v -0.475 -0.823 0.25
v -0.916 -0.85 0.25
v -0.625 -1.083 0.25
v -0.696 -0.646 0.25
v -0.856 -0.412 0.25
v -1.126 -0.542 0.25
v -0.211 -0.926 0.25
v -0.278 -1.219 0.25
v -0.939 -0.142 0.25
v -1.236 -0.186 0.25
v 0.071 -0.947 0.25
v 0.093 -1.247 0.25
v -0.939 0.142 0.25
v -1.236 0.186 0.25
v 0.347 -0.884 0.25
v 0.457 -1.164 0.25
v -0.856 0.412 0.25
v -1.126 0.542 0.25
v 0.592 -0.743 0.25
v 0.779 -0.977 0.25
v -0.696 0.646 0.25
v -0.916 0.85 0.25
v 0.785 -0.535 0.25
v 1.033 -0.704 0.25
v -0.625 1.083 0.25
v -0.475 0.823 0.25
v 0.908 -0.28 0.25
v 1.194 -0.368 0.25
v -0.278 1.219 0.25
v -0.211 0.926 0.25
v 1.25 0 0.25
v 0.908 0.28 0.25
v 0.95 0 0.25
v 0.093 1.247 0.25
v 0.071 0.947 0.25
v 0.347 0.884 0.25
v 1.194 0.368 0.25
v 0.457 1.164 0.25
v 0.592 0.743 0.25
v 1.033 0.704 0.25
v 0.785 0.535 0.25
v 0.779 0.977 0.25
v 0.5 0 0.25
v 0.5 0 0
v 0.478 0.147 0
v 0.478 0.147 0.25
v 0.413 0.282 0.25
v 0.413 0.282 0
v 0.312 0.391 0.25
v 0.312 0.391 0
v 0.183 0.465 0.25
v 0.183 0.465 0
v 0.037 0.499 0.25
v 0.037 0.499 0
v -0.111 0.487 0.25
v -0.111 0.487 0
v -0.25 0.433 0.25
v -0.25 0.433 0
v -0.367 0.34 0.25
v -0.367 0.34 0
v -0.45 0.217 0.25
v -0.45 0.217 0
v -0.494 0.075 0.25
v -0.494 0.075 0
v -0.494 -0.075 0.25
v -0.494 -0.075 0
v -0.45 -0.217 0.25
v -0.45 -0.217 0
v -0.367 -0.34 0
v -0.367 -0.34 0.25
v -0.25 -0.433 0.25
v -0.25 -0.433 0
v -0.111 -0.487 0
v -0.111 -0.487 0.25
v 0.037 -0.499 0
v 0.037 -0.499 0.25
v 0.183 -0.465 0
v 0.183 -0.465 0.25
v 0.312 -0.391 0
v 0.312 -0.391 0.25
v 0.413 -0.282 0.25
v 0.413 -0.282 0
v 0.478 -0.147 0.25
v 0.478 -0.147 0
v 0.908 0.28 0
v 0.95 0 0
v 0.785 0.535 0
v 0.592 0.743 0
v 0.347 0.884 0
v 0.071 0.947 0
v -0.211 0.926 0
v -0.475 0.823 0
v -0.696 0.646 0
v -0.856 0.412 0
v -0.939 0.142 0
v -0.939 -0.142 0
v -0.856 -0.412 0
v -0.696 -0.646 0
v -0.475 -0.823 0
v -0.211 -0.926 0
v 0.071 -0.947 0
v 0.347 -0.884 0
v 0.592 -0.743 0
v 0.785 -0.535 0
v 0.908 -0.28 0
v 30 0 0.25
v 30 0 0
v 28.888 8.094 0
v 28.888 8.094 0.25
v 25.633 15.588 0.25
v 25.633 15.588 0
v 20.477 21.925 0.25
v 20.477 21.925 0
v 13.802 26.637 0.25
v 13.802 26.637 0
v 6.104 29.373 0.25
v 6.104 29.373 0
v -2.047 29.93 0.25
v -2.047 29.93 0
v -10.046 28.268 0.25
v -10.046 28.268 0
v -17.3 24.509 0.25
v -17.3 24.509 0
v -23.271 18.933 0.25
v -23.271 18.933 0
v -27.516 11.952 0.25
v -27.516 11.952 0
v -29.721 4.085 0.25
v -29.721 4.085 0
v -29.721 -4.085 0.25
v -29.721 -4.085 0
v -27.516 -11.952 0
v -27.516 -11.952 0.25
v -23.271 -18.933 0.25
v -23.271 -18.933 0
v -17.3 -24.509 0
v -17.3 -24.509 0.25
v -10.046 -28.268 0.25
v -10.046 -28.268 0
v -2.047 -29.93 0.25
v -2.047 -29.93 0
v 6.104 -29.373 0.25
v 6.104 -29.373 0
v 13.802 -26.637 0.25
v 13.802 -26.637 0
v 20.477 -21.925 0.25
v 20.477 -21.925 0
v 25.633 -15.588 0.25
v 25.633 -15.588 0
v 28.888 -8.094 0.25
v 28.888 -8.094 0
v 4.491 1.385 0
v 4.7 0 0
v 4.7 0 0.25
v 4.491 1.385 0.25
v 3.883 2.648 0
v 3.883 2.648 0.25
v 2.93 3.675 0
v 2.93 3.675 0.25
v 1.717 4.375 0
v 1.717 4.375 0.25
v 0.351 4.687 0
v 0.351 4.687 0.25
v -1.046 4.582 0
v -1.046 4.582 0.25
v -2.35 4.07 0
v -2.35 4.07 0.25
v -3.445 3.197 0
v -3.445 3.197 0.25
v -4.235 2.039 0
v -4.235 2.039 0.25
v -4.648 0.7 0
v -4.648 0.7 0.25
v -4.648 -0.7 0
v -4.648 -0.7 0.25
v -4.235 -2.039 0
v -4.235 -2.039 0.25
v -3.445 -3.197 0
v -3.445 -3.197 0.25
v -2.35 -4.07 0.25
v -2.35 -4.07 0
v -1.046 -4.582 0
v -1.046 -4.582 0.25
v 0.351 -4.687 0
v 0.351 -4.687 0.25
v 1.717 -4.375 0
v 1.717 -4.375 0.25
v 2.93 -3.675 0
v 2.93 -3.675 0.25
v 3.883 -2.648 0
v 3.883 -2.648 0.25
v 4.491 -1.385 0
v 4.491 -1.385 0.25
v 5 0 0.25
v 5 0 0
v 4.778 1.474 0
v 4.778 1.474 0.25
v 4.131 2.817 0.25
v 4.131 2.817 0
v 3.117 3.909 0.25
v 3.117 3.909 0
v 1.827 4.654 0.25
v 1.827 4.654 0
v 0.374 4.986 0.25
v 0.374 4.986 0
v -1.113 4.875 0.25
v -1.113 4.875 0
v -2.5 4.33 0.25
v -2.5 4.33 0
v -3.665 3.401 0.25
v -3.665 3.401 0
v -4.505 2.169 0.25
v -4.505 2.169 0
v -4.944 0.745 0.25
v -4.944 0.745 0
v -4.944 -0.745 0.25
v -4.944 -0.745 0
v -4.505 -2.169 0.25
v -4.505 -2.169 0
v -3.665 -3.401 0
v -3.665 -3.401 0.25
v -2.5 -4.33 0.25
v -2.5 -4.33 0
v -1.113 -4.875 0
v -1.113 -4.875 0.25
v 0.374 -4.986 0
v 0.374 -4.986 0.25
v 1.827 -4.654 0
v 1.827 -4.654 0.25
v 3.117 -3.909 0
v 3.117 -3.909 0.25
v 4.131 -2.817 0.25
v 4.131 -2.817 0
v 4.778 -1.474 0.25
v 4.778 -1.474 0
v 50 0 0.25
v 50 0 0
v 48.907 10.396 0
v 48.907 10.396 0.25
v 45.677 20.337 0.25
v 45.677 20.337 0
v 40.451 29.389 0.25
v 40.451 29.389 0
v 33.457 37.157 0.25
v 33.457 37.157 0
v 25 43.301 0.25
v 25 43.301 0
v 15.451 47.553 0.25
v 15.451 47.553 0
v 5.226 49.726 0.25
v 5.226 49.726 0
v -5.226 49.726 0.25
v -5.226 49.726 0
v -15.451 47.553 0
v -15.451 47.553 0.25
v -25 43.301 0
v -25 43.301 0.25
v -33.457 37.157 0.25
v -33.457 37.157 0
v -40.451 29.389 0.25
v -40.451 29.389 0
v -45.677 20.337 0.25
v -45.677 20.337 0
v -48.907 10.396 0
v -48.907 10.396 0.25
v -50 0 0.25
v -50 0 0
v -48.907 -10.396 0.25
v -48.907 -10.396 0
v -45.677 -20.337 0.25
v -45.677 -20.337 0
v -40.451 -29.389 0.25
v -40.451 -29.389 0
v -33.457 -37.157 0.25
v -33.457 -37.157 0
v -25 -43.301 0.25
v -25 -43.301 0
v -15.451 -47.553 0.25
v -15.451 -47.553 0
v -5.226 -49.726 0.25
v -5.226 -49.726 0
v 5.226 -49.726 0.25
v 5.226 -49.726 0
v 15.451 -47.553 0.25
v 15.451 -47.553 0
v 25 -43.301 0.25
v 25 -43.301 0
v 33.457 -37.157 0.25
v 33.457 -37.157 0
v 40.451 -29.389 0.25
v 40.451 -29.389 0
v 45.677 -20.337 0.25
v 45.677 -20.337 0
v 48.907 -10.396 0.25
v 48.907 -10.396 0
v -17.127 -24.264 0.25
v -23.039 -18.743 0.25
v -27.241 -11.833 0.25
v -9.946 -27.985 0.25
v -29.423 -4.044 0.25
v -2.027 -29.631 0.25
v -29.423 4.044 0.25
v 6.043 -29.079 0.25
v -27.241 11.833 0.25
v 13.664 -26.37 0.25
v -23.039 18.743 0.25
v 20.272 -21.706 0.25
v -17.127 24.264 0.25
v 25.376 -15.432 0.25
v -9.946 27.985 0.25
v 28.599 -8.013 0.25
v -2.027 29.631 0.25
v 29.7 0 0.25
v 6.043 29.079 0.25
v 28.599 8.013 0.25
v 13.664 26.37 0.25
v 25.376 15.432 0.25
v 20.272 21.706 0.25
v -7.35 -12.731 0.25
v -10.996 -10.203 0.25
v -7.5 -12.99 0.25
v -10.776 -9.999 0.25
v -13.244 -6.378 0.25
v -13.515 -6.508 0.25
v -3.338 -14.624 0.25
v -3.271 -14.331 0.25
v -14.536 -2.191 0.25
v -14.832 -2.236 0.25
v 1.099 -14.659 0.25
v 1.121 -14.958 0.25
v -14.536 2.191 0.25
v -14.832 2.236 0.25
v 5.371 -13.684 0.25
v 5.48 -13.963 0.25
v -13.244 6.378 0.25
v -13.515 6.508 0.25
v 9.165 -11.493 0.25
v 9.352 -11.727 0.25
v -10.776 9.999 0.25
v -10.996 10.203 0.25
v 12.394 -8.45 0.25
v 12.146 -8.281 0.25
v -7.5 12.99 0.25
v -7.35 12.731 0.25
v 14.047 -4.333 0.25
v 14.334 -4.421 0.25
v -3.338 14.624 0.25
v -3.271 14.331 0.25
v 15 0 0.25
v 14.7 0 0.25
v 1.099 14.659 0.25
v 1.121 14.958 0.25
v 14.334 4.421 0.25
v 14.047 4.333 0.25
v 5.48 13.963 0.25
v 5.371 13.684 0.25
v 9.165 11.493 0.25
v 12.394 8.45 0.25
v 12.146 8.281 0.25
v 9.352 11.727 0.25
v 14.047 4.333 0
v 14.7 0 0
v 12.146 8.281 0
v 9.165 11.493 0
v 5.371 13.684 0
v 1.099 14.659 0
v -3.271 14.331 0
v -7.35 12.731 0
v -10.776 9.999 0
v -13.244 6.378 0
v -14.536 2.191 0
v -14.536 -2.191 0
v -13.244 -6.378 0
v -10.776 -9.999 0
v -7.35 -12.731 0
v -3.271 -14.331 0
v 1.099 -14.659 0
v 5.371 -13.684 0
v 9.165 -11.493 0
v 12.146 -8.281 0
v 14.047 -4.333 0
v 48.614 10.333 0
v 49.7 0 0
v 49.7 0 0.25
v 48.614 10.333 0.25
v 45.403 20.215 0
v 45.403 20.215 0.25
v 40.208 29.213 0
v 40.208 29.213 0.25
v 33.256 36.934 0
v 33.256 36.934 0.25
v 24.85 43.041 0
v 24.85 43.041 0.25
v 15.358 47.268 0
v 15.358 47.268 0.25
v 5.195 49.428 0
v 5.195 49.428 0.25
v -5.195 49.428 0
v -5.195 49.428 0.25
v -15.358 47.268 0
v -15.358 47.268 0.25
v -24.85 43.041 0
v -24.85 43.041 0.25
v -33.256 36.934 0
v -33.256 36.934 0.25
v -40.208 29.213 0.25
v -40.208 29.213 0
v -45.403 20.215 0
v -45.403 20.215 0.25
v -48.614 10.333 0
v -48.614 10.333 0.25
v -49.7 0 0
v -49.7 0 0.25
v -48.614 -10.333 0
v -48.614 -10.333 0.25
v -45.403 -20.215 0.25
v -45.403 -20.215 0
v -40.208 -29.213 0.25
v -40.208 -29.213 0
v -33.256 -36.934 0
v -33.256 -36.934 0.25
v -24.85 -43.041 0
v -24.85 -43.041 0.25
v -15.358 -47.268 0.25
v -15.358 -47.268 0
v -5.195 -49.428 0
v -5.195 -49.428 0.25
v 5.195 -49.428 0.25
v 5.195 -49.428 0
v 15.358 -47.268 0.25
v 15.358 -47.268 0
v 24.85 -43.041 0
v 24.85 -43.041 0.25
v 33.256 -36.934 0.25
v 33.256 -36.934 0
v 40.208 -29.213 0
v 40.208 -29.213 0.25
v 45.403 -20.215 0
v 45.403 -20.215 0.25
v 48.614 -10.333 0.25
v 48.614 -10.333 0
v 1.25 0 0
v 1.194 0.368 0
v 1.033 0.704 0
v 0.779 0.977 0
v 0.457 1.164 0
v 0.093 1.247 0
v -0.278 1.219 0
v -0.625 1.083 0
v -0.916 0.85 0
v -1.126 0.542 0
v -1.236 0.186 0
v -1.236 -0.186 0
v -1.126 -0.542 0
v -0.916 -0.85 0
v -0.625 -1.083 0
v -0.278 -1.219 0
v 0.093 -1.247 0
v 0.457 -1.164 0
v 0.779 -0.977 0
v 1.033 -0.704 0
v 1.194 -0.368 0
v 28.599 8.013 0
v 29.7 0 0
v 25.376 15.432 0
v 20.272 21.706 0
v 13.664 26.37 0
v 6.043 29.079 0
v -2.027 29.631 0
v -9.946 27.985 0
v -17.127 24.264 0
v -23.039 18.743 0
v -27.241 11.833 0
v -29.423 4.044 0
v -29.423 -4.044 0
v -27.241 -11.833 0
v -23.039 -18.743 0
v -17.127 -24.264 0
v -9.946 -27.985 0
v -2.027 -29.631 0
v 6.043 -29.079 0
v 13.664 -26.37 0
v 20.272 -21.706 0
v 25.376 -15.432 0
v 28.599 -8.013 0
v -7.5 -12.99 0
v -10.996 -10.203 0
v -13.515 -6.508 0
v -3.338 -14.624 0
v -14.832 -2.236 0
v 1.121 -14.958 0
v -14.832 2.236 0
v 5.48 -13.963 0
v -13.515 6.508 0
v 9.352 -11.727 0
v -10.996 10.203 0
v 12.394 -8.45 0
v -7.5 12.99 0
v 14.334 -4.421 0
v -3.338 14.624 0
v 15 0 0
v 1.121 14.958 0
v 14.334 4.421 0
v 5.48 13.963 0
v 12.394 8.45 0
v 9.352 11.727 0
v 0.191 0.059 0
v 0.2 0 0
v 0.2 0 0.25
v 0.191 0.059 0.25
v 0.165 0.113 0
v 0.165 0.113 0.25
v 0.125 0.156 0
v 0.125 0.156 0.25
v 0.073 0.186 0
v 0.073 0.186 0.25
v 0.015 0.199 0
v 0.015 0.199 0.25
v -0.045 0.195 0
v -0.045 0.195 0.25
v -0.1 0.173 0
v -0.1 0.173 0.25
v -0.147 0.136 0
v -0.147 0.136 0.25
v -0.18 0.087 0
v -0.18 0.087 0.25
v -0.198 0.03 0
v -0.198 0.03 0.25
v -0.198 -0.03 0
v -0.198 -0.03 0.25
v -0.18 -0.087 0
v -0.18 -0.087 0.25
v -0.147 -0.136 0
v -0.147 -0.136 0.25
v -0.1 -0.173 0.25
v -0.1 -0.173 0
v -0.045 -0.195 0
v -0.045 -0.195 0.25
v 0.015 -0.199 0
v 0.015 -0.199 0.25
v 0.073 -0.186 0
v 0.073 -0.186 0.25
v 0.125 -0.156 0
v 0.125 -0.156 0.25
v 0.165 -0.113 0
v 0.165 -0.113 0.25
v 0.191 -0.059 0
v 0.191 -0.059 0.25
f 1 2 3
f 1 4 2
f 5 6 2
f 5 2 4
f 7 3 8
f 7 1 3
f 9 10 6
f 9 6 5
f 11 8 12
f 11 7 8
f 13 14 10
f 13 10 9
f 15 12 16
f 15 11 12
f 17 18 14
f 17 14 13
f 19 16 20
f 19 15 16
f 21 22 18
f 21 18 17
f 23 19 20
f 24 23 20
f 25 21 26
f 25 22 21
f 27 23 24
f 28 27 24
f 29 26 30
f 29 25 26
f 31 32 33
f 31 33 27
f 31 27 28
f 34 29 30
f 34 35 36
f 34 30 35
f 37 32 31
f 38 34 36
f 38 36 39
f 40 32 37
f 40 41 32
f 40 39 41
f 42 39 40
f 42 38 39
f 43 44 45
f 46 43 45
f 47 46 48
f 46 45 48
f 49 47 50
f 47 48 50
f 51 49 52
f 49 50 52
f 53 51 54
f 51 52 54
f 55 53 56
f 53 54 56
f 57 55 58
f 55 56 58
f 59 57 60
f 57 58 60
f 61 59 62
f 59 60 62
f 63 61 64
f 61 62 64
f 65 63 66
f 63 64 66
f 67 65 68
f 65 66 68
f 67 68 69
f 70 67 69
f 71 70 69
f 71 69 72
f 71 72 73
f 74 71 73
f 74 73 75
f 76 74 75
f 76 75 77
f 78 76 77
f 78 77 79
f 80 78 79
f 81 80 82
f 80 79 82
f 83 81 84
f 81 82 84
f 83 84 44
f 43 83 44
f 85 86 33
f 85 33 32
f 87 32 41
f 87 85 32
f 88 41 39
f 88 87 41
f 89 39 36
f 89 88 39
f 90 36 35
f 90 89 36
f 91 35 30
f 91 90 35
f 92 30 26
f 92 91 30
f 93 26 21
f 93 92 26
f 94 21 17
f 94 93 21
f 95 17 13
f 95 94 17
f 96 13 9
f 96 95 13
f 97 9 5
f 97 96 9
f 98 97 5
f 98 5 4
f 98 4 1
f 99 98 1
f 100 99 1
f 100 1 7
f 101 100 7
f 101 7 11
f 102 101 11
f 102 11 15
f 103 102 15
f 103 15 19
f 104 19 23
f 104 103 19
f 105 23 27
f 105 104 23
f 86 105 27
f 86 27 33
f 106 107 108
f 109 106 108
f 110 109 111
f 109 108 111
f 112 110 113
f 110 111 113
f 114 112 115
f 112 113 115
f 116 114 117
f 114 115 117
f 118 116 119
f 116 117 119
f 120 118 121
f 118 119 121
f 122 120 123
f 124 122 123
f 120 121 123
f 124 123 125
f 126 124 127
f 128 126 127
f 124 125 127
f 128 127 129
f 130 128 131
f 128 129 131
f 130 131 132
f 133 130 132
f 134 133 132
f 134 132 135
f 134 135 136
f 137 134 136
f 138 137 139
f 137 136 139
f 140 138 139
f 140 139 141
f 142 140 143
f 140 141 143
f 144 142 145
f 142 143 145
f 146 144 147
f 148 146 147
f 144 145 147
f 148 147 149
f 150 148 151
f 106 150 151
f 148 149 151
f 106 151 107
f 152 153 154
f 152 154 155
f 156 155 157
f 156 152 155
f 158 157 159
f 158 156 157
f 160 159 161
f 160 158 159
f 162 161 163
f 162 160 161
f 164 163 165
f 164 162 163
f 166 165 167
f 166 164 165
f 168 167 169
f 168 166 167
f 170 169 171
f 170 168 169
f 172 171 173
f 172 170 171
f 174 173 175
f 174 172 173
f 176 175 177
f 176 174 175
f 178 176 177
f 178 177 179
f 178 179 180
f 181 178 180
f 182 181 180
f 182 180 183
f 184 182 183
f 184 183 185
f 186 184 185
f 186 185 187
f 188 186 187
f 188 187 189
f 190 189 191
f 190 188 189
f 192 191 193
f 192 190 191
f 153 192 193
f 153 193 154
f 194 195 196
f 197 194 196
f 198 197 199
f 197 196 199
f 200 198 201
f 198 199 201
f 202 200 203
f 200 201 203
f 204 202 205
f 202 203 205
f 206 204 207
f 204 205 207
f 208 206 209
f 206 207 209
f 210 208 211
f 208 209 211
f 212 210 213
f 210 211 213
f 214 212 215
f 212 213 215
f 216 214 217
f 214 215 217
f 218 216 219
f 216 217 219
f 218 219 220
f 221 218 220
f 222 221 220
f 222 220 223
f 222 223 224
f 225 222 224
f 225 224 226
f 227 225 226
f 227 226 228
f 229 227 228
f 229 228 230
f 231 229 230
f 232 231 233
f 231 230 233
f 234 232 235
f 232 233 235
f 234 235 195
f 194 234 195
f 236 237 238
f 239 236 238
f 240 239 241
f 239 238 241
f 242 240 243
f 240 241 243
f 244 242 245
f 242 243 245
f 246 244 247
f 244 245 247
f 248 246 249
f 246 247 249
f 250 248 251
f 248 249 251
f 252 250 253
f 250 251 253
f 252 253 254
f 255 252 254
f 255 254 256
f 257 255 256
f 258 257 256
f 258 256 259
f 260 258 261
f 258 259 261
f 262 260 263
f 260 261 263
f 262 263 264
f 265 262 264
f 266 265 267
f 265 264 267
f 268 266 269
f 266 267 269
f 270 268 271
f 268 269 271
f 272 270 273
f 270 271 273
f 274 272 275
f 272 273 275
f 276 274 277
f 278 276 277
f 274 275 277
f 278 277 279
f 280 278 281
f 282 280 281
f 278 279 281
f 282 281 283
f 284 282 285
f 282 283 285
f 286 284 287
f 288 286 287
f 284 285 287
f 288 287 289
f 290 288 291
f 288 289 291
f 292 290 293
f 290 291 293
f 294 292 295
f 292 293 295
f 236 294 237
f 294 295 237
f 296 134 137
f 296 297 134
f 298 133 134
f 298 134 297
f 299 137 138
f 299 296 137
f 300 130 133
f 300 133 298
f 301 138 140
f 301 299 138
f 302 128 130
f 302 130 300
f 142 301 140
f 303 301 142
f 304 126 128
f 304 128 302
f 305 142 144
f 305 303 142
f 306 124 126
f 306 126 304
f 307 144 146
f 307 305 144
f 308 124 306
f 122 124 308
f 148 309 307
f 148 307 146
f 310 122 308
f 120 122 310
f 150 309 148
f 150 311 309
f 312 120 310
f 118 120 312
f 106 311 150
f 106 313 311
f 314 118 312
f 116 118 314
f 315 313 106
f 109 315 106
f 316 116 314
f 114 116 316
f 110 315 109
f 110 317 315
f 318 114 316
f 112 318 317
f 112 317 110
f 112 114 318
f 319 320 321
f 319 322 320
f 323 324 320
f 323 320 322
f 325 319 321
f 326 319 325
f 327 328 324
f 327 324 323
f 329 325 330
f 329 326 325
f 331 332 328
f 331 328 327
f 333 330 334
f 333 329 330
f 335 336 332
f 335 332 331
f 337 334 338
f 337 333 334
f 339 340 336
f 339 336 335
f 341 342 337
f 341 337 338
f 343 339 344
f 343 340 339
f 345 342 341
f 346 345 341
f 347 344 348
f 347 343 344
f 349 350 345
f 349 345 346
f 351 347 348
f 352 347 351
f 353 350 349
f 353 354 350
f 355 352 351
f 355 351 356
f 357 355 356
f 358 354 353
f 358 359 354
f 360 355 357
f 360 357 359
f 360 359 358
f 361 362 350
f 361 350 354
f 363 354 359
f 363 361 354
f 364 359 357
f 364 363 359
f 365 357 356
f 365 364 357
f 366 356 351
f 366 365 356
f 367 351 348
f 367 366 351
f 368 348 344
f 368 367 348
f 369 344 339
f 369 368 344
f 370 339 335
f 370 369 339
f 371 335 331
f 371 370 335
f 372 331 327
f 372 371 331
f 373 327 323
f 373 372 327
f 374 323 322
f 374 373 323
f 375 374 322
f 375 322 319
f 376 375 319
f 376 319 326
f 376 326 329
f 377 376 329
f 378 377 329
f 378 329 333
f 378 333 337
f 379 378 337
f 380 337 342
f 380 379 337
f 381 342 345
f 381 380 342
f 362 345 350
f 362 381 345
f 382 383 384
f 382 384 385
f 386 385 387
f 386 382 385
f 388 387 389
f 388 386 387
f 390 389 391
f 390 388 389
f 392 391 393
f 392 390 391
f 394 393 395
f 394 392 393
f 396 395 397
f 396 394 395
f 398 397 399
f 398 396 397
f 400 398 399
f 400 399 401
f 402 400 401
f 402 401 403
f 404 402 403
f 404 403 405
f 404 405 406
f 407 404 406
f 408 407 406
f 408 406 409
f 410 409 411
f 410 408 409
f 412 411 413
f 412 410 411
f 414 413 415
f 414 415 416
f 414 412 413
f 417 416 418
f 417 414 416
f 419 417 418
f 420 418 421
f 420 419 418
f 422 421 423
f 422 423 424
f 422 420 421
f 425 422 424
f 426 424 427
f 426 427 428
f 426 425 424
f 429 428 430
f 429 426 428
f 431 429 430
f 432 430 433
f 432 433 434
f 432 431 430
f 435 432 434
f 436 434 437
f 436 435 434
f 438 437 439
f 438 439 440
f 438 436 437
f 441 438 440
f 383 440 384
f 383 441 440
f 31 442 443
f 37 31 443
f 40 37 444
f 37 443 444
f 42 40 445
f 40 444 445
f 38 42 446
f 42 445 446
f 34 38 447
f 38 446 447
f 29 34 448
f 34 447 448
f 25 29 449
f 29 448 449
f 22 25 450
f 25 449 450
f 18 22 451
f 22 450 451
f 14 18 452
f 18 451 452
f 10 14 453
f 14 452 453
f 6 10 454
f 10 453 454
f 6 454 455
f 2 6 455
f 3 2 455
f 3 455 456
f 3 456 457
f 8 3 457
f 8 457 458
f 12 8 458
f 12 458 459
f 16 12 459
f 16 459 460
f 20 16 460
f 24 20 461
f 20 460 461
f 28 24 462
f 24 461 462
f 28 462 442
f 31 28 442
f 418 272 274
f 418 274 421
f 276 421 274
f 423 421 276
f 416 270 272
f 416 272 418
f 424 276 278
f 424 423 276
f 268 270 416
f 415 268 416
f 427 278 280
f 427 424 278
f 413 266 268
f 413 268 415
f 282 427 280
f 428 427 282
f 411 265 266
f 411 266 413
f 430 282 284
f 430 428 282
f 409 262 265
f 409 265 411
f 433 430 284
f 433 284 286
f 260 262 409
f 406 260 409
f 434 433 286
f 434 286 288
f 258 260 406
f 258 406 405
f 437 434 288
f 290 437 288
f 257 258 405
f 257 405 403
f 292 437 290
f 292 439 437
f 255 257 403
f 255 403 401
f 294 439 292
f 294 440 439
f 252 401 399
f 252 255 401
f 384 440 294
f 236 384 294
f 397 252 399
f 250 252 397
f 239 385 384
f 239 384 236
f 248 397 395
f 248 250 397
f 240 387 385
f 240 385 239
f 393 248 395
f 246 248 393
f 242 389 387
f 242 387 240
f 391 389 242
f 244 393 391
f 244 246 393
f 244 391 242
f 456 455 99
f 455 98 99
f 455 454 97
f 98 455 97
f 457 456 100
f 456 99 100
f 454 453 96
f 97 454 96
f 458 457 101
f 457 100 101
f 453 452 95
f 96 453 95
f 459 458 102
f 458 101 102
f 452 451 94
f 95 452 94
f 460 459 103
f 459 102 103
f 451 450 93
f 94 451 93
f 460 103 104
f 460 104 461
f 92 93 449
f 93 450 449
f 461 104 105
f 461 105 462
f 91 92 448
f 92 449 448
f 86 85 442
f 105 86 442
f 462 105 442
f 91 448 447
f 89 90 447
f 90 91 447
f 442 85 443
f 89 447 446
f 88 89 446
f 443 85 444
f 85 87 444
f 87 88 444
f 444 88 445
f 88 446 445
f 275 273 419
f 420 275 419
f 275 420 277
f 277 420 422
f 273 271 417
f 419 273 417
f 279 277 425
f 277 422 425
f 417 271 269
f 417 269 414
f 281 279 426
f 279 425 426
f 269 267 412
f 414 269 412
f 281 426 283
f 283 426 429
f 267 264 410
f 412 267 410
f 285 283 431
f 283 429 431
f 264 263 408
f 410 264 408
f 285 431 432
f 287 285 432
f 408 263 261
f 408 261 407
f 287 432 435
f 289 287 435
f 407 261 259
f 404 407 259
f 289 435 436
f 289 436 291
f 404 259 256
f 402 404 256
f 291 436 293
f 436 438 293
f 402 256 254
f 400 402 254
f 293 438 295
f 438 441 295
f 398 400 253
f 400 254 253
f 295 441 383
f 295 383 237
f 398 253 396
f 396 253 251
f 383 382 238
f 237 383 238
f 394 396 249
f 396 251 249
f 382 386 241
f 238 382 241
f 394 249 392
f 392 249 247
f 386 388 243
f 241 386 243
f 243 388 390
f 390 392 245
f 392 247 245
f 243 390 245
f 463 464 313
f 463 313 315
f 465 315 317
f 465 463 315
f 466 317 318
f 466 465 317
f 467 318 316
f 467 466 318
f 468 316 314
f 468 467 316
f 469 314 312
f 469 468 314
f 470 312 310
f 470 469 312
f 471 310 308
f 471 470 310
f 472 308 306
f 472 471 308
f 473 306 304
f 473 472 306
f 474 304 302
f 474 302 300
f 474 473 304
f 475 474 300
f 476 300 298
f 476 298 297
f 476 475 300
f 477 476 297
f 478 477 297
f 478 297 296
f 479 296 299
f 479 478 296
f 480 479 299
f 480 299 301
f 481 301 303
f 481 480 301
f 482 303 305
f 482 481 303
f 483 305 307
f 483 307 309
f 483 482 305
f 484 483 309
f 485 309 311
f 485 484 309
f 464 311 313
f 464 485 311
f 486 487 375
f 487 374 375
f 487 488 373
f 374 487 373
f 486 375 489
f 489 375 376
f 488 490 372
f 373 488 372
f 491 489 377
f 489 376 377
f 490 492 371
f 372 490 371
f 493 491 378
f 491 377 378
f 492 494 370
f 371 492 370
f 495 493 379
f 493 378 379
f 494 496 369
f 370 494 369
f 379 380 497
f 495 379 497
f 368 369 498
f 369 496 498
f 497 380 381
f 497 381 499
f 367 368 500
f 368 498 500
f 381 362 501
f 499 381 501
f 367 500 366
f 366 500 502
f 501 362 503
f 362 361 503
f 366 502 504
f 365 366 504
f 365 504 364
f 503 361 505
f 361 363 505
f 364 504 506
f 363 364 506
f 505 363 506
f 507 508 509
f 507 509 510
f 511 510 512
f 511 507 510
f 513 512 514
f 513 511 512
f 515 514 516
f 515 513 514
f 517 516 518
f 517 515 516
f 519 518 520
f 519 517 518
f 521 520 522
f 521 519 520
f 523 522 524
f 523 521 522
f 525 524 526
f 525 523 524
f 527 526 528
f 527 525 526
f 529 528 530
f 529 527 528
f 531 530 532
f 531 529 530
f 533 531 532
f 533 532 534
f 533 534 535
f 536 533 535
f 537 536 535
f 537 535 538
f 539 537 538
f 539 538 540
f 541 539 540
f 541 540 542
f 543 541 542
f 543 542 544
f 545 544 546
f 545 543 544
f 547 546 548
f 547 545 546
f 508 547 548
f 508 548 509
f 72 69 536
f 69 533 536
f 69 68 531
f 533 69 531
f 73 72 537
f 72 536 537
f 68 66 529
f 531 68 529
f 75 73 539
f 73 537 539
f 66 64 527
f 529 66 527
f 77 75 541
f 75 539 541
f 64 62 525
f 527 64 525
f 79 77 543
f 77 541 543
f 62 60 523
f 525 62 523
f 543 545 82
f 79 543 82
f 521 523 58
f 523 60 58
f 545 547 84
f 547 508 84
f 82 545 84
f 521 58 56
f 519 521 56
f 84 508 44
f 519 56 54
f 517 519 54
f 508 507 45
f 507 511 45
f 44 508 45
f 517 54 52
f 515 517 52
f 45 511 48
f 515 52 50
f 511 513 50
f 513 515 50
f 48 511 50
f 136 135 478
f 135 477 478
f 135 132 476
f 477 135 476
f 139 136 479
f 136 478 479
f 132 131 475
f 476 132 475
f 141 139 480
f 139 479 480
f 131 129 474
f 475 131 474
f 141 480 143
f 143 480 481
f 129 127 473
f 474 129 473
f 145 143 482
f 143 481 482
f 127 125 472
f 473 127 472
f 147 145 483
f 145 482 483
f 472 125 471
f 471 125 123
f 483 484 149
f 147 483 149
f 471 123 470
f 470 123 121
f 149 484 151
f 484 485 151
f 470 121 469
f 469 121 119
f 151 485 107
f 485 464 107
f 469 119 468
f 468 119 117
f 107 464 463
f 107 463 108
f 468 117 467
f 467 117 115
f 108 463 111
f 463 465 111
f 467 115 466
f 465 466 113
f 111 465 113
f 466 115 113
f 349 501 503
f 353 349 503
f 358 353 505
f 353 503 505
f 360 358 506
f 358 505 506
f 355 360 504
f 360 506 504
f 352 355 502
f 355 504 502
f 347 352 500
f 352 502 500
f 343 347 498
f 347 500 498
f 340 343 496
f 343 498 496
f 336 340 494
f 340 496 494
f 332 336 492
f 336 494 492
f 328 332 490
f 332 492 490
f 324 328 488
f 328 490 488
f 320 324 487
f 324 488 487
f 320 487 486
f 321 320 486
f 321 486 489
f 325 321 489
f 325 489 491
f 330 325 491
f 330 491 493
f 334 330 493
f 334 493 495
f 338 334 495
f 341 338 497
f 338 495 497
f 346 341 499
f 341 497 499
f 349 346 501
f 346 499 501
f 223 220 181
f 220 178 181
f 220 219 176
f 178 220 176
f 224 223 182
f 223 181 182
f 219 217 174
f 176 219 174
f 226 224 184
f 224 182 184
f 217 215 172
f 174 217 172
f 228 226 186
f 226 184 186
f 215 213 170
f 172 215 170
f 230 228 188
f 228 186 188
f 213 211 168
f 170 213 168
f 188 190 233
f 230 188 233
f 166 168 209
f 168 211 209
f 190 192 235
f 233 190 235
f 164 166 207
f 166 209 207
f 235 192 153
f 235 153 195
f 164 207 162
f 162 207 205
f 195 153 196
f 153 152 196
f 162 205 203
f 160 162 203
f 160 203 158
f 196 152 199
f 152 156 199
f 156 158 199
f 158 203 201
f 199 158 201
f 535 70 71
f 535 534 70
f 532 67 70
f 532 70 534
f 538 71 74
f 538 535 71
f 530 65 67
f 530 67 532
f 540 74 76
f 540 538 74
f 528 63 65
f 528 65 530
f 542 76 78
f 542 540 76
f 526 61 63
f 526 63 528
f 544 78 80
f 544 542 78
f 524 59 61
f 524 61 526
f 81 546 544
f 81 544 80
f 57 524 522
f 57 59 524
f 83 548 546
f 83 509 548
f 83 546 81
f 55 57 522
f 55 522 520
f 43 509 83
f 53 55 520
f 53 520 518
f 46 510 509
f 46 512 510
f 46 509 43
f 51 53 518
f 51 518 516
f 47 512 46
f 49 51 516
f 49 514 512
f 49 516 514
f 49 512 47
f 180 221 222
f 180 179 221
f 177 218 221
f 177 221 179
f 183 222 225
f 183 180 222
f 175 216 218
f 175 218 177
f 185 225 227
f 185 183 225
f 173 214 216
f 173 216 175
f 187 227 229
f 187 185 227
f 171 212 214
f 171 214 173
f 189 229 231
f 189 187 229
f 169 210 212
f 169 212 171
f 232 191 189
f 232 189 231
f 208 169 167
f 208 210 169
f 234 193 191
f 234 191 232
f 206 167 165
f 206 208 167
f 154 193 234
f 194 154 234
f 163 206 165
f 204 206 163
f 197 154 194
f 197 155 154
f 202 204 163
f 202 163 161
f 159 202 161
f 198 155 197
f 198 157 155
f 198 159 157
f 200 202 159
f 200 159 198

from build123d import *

# Parameters (mm, degrees)
F0_R     = 30
F0_R_2   = 29.7
F1_DEPTH = 0.25
F0_R_3   = 15
F0_R_4   = 14.7
F0_R_5   = 5
F0_R_6   = 4.7
F0_R_7   = 1.25
F0_R_8   = 0.95
F0_R_9   = 0.5
F0_R_10  = 0.2
F0_R_11  = 50
F0_R_12  = 49.7


with BuildPart() as f1:
    # F0 (on Top) → F1 (new body)
    with BuildSketch(Plane.XY):
        Circle(F0_R)
        Circle(F0_R_2, mode=Mode.SUBTRACT)
    extrude(amount=F1_DEPTH)


with BuildPart() as f1b:
    # F0 (on Top) → F1, piece 2 (new body)
    with BuildSketch(Plane.XY):
        Circle(F0_R_3)
        Circle(F0_R_4, mode=Mode.SUBTRACT)
    extrude(amount=F1_DEPTH)


with BuildPart() as f1c:
    # F0 (on Top) → F1, piece 3 (new body)
    with BuildSketch(Plane.XY):
        Circle(F0_R_5)
        Circle(F0_R_6, mode=Mode.SUBTRACT)
    extrude(amount=F1_DEPTH)


with BuildPart() as f1d:
    # F0 (on Top) → F1, piece 4 (new body)
    with BuildSketch(Plane.XY):
        Circle(F0_R_7)
        Circle(F0_R_8, mode=Mode.SUBTRACT)
    extrude(amount=F1_DEPTH)


with BuildPart() as f1e:
    # F0 (on Top) → F1, piece 5 (new body)
    with BuildSketch(Plane.XY):
        Circle(F0_R_9)
        Circle(F0_R_10, mode=Mode.SUBTRACT)
    extrude(amount=F1_DEPTH)


with BuildPart() as f1f:
    # F0 (on Top) → F1, piece 6 (new body)
    with BuildSketch(Plane.XY):
        Circle(F0_R_11)
        Circle(F0_R_12, mode=Mode.SUBTRACT)
    extrude(amount=F1_DEPTH)


solid = Compound([f1.part, f1b.part, f1c.part, f1d.part, f1e.part, f1f.part])
